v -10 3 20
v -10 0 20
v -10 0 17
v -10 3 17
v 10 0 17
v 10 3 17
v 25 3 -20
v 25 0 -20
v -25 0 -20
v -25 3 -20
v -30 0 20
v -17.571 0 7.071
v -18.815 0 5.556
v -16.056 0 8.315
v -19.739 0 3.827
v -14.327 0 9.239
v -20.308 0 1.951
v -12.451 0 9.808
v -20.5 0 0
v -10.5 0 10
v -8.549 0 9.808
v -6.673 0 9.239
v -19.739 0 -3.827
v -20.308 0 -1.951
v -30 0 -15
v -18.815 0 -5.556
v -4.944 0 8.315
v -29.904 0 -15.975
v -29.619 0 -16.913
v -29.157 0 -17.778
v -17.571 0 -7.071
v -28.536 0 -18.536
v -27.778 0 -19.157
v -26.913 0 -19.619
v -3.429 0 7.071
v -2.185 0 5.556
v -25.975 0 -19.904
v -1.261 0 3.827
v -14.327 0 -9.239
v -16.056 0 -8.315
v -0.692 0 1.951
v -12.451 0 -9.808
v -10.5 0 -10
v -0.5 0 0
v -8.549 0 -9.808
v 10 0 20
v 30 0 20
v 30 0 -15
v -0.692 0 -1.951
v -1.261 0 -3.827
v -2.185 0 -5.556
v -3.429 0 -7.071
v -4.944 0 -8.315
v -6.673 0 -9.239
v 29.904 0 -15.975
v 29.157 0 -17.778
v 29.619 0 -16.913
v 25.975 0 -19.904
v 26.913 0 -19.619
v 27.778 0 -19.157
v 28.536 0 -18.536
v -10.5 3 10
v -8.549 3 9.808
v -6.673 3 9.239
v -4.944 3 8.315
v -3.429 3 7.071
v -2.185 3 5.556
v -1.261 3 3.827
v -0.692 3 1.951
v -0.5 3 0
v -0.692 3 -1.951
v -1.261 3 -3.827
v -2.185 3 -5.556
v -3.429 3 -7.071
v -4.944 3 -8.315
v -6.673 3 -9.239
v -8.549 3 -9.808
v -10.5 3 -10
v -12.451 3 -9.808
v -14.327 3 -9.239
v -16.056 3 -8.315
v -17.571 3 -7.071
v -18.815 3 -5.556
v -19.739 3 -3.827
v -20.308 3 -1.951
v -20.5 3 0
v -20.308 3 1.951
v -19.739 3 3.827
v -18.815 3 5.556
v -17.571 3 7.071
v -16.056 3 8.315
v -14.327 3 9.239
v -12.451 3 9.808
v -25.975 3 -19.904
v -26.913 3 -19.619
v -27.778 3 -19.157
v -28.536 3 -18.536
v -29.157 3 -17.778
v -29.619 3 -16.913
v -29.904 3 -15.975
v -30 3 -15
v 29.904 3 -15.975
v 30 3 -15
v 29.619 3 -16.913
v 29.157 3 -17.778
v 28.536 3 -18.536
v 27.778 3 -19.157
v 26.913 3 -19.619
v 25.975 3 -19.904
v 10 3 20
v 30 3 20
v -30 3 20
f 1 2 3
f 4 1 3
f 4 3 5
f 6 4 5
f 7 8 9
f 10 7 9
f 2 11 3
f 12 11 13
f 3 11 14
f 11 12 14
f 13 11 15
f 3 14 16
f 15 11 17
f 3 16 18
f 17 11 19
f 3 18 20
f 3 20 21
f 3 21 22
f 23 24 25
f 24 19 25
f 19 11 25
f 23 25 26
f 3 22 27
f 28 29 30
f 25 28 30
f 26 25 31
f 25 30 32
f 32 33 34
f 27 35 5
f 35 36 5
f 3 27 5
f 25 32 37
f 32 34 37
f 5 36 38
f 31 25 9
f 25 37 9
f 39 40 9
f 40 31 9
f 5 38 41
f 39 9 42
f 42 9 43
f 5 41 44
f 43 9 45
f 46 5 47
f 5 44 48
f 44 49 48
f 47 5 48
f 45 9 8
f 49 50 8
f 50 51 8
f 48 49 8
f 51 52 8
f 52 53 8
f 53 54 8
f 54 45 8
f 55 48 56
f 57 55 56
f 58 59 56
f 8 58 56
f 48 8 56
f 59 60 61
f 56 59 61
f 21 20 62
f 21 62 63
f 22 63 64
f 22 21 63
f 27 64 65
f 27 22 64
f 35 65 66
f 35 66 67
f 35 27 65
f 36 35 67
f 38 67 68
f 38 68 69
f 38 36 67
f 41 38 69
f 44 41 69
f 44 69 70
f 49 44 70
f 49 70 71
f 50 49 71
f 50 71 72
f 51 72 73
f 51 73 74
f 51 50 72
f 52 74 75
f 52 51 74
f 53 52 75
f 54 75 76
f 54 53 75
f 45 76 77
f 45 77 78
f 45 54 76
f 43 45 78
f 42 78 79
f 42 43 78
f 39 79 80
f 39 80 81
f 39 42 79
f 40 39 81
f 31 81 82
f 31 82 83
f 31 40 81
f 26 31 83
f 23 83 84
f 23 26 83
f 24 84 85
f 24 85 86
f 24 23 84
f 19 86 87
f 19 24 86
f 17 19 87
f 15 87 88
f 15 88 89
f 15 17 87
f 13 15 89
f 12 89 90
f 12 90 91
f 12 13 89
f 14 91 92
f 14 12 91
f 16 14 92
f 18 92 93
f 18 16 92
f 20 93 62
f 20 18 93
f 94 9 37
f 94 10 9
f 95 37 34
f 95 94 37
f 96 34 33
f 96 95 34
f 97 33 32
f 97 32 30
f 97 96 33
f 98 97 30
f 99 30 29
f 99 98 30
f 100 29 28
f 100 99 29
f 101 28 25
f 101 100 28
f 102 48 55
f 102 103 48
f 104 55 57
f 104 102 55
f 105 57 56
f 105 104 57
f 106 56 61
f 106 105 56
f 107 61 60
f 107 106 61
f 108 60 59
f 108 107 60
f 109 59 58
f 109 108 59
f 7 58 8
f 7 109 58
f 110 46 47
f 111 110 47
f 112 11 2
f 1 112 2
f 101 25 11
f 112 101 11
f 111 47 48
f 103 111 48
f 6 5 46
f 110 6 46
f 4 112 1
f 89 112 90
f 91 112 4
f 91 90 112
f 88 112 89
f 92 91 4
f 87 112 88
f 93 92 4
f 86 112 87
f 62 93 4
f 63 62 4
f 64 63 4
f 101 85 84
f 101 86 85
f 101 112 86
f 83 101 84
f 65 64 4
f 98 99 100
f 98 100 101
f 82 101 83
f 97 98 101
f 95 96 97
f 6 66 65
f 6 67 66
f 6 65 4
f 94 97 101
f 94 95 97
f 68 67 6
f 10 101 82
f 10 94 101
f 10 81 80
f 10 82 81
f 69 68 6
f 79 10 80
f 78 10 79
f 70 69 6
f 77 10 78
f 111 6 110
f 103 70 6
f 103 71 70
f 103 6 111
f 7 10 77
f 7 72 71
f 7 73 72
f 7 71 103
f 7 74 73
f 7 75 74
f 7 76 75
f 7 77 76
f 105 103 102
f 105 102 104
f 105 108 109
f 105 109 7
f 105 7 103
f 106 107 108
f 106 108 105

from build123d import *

# Parameters (mm, degrees)
SKETCH1_R           = 10
BOSS_EXTRUDE1_DEPTH = 3
FILLET1_R           = 5


with BuildPart() as part:
    # Sketch1 → Boss-Extrude1 (new body)
    with BuildSketch(Plane(origin=(0, 0, 0), x_dir=(1, 0, 0), z_dir=(0, 1, 0))):
        Polygon((10, -20), (30, -20), (30, 20), (-30, 20), (-30, -20), (-10, -20), (-10, -17), (10, -17), align=None)
        with Locations(Location((-10.5, 0, 0), (0, 0, 270))):
            Circle(SKETCH1_R, mode=Mode.SUBTRACT)
    extrude(amount=BOSS_EXTRUDE1_DEPTH)

    # Fillet1
    fillet1_edges = [part.edges().sort_by_distance(p)[0] for p in [
        (-30, 1.5, -20),
        (30, 1.5, -20),
    ]]
    fillet(fillet1_edges, radius=FILLET1_R)


solid = part.part
